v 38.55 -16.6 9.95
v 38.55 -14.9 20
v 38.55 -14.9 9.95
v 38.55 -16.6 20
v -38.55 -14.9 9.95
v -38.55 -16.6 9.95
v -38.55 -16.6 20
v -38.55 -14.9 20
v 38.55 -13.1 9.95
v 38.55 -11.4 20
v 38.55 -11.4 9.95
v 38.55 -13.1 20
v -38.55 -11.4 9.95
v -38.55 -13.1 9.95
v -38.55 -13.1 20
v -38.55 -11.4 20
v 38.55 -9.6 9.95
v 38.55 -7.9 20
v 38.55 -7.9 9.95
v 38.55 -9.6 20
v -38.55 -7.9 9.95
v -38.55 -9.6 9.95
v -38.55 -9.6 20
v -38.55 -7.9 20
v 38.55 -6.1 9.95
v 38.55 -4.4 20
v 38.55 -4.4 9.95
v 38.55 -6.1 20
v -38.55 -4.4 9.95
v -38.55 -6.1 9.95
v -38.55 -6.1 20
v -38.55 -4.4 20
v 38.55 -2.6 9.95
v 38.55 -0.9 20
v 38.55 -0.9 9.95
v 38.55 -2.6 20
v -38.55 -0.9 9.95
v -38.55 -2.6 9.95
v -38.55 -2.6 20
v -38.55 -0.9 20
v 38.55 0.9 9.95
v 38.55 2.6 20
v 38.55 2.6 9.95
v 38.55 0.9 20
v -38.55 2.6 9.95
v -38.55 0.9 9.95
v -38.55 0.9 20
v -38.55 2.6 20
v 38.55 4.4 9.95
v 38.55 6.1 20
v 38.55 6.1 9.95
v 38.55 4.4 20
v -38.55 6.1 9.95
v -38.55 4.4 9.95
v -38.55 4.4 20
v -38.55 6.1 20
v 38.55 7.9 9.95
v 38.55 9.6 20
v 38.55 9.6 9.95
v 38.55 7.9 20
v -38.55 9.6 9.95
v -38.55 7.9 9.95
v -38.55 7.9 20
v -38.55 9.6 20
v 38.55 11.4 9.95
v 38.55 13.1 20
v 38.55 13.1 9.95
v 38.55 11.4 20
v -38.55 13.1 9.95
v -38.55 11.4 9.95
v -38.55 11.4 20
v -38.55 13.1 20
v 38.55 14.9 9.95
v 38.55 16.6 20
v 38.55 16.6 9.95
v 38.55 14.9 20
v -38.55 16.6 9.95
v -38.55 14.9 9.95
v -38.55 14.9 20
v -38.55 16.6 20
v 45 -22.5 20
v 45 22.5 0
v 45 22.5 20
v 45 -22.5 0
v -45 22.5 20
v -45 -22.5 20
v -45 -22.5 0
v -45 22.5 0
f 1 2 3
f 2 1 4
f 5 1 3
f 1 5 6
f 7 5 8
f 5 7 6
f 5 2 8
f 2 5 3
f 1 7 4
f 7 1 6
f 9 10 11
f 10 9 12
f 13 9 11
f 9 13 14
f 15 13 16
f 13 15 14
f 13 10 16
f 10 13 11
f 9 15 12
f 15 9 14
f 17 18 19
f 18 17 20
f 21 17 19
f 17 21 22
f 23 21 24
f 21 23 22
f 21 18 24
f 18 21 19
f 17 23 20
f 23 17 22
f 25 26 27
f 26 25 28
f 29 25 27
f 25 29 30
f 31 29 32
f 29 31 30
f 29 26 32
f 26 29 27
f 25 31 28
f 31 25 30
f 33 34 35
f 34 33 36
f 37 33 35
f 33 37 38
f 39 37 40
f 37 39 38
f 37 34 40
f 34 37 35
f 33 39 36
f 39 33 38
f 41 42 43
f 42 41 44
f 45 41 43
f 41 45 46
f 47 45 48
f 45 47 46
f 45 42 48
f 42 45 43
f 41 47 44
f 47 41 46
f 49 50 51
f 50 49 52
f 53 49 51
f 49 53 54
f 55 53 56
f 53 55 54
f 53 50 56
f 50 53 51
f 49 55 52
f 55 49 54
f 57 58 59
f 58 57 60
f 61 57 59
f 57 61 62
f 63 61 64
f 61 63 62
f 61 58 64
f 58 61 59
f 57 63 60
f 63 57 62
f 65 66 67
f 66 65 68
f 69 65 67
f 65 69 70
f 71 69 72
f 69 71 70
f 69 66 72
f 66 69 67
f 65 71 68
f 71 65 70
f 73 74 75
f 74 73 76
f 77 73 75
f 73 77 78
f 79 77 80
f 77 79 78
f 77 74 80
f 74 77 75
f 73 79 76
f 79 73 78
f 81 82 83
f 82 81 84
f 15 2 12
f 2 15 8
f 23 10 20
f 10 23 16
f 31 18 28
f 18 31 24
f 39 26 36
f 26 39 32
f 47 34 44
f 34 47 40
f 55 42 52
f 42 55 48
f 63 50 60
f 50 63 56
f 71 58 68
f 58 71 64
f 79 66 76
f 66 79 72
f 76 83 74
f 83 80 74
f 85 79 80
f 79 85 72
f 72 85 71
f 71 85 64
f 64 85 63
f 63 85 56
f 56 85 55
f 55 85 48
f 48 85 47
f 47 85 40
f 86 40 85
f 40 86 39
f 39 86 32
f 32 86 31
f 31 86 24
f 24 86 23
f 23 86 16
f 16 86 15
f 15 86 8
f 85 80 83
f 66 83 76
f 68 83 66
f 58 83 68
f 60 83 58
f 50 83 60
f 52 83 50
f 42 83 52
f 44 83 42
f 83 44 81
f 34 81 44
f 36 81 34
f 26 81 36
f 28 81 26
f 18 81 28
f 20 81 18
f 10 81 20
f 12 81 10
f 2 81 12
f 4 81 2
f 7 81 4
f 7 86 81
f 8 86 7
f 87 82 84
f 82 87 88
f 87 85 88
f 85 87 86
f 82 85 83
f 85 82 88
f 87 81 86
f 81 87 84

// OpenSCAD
$fn = 64;

// Block dimensions
BLOCK_X = 90;       // Length in X
BLOCK_Y = 45;       // Width in Y
BLOCK_Z = 20;       // Height in Z

// Slot dimensions
SLOT_LEN = 77;      // Length along X
SLOT_WID = 1.6;     // Width along Y
SLOT_DEPTH = 10;    // Depth from top face
SLOT_SPACING = 3.5; // Centre-to-centre spacing in Y
NUM_SLOTS = 10;     // Number of slots

// Extension for boolean cuts to avoid coplanar faces
EXT = 0.1;

difference() {
    // Main base block (centred in X/Y, rests on XY plane at z=0)
    translate([0, 0, BLOCK_Z / 2]) {
        cube([BLOCK_X, BLOCK_Y, BLOCK_Z], center = true);
    }

    // Cut slots
    for (i = [0 : NUM_SLOTS - 1]) {
        y_center = (i - (NUM_SLOTS - 1) / 2) * SLOT_SPACING;
        translate([0, y_center, BLOCK_Z - SLOT_DEPTH / 2]) {
            cube([SLOT_LEN + EXT, SLOT_WID + EXT, SLOT_DEPTH + EXT], center = true);
        }
    }
}
